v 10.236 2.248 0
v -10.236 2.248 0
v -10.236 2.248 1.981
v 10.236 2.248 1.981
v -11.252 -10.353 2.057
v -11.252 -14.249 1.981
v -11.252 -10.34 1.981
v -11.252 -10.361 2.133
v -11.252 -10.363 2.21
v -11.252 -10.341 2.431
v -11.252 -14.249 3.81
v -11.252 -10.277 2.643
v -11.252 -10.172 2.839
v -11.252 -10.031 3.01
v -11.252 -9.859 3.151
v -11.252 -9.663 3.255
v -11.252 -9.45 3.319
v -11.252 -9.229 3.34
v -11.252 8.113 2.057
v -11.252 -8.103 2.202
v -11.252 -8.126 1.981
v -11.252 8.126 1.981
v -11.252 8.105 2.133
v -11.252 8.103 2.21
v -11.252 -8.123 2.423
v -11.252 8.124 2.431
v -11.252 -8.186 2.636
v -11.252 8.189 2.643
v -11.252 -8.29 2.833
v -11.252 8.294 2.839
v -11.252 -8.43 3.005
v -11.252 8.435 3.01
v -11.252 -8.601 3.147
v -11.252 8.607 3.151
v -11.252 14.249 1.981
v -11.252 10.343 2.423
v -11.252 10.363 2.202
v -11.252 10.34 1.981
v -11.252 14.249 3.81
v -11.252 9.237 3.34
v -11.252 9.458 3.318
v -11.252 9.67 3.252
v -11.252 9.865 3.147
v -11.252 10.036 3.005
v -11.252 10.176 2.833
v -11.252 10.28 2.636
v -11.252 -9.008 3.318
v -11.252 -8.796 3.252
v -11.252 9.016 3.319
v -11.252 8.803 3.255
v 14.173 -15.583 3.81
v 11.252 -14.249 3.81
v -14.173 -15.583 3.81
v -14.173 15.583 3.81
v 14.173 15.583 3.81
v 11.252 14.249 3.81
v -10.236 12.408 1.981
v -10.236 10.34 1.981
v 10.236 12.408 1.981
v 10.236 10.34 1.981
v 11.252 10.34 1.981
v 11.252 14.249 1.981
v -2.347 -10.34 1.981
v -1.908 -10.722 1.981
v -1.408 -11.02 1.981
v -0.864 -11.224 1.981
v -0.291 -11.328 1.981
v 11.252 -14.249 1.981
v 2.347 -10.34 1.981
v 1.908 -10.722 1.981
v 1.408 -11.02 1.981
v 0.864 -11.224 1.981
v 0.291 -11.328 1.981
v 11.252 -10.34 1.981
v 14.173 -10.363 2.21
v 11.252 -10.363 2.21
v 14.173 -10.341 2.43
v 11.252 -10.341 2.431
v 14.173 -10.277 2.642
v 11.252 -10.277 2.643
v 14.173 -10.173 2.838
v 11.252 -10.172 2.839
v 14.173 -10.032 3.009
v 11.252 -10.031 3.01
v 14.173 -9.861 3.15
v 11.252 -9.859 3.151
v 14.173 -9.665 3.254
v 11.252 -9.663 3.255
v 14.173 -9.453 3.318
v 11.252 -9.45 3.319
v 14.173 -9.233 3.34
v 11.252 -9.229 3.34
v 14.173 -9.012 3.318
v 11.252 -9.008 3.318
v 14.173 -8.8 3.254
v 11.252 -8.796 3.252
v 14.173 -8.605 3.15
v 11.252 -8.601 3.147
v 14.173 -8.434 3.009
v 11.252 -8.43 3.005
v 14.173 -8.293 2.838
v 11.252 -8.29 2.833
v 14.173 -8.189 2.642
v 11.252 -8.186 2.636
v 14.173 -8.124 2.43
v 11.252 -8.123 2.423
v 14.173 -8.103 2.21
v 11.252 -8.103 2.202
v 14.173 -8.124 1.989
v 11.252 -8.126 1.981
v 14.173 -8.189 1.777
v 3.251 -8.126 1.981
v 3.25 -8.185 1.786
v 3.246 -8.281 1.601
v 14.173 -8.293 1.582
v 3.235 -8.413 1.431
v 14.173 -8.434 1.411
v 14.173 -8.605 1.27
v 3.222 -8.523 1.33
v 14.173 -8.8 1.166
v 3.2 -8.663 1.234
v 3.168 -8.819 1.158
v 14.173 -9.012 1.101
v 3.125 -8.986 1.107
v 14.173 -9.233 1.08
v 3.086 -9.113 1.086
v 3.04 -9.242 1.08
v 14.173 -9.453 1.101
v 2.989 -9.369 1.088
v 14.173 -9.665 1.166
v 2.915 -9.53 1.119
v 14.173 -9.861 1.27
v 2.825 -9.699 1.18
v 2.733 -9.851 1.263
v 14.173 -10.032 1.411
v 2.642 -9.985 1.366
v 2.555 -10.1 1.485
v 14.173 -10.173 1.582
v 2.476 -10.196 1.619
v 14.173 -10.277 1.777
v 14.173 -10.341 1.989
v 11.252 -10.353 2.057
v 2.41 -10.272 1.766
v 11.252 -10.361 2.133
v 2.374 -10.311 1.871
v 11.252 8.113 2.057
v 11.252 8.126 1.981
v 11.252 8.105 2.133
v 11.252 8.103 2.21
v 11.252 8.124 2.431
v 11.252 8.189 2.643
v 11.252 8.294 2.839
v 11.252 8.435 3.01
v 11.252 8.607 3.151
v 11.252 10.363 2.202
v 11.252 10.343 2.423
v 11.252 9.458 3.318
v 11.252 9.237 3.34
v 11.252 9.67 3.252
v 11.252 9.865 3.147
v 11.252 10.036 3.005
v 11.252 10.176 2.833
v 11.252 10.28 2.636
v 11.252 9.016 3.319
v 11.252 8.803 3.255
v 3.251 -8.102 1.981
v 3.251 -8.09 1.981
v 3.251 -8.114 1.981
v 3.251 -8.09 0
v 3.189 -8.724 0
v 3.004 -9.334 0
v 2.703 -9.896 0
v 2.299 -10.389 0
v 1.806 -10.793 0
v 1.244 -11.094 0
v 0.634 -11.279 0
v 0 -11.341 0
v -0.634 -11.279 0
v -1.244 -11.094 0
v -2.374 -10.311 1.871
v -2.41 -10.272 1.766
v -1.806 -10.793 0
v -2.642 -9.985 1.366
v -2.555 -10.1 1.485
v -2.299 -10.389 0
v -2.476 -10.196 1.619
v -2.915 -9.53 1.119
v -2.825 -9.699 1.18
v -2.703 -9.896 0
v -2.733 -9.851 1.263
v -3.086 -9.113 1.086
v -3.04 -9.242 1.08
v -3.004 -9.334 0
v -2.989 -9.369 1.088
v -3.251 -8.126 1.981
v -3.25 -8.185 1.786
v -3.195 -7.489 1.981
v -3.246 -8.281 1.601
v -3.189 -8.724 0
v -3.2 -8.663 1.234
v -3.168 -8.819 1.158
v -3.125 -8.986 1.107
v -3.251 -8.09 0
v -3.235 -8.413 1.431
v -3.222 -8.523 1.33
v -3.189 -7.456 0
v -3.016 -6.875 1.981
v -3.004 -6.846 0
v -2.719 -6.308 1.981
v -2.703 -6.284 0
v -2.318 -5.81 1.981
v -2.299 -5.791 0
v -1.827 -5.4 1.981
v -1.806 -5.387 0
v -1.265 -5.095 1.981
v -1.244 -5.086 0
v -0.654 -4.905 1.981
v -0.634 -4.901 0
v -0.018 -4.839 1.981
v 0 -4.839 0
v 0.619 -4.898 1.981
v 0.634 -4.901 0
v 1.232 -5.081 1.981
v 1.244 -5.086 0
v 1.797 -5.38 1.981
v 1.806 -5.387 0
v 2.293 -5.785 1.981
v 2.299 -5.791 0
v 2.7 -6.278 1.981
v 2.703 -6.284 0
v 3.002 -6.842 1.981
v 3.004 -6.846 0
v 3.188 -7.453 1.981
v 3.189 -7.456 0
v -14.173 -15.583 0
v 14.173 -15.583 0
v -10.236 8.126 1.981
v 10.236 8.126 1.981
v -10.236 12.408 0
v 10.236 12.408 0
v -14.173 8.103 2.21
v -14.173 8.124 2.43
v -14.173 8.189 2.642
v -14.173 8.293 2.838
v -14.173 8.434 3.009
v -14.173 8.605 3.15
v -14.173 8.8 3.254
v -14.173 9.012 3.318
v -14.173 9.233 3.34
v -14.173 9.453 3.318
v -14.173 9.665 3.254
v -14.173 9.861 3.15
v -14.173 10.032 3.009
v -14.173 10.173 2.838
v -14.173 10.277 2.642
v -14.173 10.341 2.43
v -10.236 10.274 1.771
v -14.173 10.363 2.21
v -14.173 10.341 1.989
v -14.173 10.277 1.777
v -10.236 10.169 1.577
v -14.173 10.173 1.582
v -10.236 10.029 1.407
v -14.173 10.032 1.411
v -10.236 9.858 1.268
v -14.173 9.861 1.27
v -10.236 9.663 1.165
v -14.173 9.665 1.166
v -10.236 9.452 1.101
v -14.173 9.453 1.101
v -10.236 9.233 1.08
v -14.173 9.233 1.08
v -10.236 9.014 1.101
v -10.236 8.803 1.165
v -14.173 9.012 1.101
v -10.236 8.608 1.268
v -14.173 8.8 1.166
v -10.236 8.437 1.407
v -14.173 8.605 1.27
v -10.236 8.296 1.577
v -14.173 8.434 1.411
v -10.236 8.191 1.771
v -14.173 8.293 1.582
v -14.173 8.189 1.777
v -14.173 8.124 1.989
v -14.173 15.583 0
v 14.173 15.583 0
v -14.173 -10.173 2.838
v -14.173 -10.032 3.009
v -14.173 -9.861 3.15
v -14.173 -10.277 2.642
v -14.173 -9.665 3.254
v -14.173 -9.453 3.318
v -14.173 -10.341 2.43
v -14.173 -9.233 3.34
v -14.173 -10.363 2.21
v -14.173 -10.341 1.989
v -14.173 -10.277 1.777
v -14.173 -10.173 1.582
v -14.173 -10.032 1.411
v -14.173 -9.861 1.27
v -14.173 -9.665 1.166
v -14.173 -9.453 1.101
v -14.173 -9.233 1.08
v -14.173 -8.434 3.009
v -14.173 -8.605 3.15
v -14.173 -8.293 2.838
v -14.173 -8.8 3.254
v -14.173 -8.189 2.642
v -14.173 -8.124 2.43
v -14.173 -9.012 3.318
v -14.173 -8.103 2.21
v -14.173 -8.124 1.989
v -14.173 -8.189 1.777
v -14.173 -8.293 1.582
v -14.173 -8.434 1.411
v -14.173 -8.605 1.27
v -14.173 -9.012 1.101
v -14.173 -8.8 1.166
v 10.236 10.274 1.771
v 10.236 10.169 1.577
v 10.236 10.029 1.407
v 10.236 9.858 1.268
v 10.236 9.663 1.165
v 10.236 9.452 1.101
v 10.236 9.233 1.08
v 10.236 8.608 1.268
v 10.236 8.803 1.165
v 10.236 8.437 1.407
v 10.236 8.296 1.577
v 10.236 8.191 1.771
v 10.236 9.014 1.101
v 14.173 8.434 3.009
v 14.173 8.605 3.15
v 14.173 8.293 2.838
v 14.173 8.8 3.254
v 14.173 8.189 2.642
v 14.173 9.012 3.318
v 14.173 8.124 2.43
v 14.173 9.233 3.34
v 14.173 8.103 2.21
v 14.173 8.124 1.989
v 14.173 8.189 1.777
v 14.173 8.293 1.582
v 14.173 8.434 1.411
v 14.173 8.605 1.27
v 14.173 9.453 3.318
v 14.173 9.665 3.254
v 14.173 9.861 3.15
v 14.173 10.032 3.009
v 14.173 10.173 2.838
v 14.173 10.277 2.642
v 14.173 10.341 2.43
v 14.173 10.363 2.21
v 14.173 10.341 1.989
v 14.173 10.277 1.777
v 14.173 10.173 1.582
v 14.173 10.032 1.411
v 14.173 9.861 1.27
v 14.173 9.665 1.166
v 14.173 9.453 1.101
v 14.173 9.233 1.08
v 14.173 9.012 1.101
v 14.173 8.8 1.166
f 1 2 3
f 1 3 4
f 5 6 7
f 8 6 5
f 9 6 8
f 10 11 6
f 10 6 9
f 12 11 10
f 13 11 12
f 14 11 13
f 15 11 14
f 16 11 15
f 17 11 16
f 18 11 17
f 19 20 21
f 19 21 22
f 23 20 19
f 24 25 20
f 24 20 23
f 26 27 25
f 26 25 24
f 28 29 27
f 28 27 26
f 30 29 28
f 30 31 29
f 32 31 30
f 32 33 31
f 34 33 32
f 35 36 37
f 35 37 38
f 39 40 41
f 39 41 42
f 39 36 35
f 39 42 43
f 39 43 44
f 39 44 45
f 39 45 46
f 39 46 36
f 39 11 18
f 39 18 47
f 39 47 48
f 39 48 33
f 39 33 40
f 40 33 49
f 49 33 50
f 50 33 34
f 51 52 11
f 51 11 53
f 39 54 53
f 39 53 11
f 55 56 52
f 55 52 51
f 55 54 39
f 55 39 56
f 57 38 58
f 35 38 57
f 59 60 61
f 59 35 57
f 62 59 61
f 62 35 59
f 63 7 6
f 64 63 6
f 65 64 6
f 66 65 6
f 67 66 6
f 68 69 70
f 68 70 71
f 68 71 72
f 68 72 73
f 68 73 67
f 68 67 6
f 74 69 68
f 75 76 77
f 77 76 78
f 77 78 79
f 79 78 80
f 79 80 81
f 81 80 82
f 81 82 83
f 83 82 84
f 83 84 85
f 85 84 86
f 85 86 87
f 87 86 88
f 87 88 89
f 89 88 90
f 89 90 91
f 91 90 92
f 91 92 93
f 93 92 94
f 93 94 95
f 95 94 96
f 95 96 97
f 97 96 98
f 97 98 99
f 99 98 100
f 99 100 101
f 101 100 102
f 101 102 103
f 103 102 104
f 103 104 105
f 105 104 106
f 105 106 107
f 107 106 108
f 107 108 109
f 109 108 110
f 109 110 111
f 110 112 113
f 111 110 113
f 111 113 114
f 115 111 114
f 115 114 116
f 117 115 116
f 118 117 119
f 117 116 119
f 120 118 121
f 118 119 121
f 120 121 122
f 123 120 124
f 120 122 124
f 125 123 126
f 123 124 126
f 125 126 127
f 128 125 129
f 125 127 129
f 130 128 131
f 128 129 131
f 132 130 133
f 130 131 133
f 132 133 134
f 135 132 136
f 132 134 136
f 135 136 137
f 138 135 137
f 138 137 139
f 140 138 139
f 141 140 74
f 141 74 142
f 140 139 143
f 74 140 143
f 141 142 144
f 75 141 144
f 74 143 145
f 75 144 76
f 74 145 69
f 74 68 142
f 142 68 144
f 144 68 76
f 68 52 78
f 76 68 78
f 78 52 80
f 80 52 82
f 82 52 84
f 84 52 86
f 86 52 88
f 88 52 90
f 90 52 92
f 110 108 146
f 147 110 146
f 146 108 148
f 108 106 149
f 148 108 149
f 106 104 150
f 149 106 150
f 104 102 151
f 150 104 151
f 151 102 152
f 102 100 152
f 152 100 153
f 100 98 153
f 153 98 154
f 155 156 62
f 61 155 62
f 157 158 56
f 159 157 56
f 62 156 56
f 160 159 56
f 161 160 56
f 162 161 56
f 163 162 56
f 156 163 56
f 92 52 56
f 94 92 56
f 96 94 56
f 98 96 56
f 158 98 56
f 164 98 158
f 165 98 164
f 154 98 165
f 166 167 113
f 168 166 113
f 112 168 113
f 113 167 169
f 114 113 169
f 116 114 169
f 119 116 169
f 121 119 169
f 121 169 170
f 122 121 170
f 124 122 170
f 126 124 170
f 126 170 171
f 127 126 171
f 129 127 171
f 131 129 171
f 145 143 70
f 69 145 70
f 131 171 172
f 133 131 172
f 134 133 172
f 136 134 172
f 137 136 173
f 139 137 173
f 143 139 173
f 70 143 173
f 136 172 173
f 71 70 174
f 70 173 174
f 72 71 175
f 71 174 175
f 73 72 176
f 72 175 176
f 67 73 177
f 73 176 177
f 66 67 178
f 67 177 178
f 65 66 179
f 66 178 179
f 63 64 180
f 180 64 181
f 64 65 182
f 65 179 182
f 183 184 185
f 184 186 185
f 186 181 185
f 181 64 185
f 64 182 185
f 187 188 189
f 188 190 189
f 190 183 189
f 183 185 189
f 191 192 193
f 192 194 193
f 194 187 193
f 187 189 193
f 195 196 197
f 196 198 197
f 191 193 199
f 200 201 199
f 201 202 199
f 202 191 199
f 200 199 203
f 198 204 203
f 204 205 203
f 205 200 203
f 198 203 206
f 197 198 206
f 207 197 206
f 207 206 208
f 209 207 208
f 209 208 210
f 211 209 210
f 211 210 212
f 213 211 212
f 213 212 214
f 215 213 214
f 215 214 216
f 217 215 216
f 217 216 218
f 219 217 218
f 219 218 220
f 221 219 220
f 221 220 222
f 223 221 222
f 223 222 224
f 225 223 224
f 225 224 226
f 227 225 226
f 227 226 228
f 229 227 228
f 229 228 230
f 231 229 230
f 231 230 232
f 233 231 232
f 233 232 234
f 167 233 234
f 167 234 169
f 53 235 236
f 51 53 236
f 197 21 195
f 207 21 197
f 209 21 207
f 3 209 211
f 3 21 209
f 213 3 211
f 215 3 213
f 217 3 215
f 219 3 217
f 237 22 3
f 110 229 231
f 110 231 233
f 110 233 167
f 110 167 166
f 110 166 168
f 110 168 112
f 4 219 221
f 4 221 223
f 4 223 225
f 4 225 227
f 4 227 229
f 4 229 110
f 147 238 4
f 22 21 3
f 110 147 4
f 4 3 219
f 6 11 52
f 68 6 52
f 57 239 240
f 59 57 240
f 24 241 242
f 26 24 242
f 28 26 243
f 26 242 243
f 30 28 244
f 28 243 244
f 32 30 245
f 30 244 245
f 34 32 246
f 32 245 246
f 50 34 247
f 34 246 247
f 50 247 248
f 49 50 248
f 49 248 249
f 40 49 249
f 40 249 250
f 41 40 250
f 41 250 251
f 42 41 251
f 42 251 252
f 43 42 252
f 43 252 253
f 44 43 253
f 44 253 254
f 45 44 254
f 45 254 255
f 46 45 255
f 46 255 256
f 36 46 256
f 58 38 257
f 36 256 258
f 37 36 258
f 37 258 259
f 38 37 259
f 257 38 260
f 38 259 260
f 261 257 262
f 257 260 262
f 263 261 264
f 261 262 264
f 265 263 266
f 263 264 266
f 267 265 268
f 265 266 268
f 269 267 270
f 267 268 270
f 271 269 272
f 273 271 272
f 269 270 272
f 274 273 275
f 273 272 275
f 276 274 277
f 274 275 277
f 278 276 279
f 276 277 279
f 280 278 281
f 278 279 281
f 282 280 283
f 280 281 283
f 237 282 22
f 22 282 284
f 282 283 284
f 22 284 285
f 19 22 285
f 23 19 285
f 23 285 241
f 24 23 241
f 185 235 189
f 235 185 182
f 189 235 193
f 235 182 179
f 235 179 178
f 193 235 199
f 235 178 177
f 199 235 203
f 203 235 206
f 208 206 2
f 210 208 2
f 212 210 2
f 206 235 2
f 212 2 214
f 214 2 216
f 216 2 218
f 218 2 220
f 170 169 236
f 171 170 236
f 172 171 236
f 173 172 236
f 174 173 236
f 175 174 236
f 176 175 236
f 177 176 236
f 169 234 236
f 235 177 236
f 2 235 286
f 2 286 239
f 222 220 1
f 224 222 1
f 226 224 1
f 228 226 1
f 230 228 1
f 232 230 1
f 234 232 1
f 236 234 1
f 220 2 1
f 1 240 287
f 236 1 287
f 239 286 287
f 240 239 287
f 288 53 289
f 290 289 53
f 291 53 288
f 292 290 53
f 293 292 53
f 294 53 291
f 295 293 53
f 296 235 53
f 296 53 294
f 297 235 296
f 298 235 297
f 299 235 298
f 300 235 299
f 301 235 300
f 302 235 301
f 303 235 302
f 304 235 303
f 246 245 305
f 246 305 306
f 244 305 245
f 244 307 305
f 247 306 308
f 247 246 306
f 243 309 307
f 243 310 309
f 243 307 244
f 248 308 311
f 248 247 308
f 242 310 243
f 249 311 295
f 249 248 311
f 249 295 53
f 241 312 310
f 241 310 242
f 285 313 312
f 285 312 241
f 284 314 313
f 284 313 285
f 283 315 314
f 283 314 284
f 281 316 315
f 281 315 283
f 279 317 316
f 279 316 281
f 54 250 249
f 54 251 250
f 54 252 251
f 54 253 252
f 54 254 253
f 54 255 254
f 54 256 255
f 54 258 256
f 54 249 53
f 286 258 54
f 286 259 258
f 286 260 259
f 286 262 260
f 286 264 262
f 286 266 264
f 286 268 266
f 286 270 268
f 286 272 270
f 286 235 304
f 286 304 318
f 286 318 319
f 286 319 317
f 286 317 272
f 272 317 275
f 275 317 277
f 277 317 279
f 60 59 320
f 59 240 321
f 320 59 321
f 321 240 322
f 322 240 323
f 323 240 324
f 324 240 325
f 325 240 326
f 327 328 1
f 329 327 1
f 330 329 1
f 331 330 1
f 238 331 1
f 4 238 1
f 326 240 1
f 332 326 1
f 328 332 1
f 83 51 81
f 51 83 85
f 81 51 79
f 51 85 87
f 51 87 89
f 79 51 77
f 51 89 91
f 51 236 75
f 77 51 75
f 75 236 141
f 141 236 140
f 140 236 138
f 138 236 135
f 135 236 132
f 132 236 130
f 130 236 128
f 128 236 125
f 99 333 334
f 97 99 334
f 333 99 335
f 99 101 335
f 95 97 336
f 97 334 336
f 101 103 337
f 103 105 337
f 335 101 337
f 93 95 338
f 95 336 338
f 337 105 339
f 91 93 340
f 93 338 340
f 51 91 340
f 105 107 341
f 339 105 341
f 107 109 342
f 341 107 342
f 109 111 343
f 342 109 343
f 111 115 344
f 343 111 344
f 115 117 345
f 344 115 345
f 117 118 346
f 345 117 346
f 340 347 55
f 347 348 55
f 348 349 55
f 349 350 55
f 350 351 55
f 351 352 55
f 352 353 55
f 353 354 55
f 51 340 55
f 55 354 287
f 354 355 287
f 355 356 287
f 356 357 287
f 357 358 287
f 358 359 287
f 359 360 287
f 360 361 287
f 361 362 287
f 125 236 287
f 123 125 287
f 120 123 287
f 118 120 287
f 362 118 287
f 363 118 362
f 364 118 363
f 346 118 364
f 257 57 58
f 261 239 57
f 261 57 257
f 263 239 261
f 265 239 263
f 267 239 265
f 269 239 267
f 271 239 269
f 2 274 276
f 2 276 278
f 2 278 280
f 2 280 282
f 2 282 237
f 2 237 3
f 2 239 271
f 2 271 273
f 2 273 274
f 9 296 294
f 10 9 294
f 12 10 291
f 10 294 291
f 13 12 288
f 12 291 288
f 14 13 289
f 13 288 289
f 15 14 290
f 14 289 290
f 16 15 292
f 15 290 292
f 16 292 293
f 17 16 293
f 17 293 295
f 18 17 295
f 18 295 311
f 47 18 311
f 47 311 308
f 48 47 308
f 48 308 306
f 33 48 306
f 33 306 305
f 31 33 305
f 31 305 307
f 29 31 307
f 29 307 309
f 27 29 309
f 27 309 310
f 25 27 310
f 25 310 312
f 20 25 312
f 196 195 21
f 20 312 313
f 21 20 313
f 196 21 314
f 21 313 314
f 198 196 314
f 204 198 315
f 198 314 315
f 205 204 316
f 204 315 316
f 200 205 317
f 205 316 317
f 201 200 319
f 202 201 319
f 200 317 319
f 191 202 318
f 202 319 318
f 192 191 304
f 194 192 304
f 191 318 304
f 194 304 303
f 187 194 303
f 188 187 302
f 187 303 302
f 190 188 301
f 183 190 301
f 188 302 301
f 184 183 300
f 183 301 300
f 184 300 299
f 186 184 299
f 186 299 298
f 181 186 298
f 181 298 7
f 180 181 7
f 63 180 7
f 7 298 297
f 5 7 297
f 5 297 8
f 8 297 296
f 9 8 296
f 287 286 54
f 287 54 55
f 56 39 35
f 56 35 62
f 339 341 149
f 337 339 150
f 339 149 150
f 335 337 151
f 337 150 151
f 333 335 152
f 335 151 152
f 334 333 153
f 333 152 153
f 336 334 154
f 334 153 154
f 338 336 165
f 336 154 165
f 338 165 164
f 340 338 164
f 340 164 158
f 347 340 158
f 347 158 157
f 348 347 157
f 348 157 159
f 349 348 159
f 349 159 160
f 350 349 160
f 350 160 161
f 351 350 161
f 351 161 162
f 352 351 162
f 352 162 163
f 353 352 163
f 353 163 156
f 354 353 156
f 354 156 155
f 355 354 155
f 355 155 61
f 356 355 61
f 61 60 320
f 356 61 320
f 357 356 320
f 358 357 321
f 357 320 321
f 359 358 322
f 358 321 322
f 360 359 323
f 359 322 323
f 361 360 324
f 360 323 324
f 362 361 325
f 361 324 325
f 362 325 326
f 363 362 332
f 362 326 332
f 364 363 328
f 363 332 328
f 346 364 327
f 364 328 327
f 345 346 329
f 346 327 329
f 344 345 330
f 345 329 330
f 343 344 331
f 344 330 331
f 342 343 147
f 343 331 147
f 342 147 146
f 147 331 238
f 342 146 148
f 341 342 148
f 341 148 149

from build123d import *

# Parameters (mm, degrees)
F0_W     = 28.3464
F0_H     = 31.1658
F1_DEPTH = 3.81
F2_W     = 22.5044
F2_H     = 28.4988
F3_DEPTH = 1.8288
F4_R     = 1.1303
F5_DEPTH = 28.3474
F6_R     = 3.2512
F6_W     = 20.4724
F6_H     = 10.16
F7_DEPTH = 3.811


with BuildPart() as f1:
    # F0 (on Top) → F1 (new body)
    with BuildSketch(Plane.XY):
        Rectangle(F0_W, F0_H)
    extrude(amount=F1_DEPTH)

    # F2 (on face) → F3 (cut)
    with BuildSketch(Plane.XY.offset(3.81)):
        Rectangle(F2_W, F2_H)
    extrude(amount=-F3_DEPTH, mode=Mode.SUBTRACT)

    # F4 (on face) → F5 (cut, through all)
    with BuildSketch(Plane(origin=(-14.1732, 0, 0), x_dir=(0, -1, 0), z_dir=(-1, 0, 0))):
        with Locations((9.2329, 2.2098)):
            Circle(F4_R)
        with Locations((-9.2329, 2.2098)):
            Circle(F4_R)
    extrude(amount=-F5_DEPTH, mode=Mode.SUBTRACT)

    # F6 (on face) → F7 (cut, through all)
    with BuildSketch(Plane(origin=(0, 0, 0), x_dir=(1, 0, 0), z_dir=(0, 0, -1))):
        with Locations((0, 8.0899)):
            Circle(F6_R)
        with Locations((0, -7.3279)):
            Rectangle(F6_W, F6_H)
    extrude(amount=-F7_DEPTH, mode=Mode.SUBTRACT)


solid = f1.part
